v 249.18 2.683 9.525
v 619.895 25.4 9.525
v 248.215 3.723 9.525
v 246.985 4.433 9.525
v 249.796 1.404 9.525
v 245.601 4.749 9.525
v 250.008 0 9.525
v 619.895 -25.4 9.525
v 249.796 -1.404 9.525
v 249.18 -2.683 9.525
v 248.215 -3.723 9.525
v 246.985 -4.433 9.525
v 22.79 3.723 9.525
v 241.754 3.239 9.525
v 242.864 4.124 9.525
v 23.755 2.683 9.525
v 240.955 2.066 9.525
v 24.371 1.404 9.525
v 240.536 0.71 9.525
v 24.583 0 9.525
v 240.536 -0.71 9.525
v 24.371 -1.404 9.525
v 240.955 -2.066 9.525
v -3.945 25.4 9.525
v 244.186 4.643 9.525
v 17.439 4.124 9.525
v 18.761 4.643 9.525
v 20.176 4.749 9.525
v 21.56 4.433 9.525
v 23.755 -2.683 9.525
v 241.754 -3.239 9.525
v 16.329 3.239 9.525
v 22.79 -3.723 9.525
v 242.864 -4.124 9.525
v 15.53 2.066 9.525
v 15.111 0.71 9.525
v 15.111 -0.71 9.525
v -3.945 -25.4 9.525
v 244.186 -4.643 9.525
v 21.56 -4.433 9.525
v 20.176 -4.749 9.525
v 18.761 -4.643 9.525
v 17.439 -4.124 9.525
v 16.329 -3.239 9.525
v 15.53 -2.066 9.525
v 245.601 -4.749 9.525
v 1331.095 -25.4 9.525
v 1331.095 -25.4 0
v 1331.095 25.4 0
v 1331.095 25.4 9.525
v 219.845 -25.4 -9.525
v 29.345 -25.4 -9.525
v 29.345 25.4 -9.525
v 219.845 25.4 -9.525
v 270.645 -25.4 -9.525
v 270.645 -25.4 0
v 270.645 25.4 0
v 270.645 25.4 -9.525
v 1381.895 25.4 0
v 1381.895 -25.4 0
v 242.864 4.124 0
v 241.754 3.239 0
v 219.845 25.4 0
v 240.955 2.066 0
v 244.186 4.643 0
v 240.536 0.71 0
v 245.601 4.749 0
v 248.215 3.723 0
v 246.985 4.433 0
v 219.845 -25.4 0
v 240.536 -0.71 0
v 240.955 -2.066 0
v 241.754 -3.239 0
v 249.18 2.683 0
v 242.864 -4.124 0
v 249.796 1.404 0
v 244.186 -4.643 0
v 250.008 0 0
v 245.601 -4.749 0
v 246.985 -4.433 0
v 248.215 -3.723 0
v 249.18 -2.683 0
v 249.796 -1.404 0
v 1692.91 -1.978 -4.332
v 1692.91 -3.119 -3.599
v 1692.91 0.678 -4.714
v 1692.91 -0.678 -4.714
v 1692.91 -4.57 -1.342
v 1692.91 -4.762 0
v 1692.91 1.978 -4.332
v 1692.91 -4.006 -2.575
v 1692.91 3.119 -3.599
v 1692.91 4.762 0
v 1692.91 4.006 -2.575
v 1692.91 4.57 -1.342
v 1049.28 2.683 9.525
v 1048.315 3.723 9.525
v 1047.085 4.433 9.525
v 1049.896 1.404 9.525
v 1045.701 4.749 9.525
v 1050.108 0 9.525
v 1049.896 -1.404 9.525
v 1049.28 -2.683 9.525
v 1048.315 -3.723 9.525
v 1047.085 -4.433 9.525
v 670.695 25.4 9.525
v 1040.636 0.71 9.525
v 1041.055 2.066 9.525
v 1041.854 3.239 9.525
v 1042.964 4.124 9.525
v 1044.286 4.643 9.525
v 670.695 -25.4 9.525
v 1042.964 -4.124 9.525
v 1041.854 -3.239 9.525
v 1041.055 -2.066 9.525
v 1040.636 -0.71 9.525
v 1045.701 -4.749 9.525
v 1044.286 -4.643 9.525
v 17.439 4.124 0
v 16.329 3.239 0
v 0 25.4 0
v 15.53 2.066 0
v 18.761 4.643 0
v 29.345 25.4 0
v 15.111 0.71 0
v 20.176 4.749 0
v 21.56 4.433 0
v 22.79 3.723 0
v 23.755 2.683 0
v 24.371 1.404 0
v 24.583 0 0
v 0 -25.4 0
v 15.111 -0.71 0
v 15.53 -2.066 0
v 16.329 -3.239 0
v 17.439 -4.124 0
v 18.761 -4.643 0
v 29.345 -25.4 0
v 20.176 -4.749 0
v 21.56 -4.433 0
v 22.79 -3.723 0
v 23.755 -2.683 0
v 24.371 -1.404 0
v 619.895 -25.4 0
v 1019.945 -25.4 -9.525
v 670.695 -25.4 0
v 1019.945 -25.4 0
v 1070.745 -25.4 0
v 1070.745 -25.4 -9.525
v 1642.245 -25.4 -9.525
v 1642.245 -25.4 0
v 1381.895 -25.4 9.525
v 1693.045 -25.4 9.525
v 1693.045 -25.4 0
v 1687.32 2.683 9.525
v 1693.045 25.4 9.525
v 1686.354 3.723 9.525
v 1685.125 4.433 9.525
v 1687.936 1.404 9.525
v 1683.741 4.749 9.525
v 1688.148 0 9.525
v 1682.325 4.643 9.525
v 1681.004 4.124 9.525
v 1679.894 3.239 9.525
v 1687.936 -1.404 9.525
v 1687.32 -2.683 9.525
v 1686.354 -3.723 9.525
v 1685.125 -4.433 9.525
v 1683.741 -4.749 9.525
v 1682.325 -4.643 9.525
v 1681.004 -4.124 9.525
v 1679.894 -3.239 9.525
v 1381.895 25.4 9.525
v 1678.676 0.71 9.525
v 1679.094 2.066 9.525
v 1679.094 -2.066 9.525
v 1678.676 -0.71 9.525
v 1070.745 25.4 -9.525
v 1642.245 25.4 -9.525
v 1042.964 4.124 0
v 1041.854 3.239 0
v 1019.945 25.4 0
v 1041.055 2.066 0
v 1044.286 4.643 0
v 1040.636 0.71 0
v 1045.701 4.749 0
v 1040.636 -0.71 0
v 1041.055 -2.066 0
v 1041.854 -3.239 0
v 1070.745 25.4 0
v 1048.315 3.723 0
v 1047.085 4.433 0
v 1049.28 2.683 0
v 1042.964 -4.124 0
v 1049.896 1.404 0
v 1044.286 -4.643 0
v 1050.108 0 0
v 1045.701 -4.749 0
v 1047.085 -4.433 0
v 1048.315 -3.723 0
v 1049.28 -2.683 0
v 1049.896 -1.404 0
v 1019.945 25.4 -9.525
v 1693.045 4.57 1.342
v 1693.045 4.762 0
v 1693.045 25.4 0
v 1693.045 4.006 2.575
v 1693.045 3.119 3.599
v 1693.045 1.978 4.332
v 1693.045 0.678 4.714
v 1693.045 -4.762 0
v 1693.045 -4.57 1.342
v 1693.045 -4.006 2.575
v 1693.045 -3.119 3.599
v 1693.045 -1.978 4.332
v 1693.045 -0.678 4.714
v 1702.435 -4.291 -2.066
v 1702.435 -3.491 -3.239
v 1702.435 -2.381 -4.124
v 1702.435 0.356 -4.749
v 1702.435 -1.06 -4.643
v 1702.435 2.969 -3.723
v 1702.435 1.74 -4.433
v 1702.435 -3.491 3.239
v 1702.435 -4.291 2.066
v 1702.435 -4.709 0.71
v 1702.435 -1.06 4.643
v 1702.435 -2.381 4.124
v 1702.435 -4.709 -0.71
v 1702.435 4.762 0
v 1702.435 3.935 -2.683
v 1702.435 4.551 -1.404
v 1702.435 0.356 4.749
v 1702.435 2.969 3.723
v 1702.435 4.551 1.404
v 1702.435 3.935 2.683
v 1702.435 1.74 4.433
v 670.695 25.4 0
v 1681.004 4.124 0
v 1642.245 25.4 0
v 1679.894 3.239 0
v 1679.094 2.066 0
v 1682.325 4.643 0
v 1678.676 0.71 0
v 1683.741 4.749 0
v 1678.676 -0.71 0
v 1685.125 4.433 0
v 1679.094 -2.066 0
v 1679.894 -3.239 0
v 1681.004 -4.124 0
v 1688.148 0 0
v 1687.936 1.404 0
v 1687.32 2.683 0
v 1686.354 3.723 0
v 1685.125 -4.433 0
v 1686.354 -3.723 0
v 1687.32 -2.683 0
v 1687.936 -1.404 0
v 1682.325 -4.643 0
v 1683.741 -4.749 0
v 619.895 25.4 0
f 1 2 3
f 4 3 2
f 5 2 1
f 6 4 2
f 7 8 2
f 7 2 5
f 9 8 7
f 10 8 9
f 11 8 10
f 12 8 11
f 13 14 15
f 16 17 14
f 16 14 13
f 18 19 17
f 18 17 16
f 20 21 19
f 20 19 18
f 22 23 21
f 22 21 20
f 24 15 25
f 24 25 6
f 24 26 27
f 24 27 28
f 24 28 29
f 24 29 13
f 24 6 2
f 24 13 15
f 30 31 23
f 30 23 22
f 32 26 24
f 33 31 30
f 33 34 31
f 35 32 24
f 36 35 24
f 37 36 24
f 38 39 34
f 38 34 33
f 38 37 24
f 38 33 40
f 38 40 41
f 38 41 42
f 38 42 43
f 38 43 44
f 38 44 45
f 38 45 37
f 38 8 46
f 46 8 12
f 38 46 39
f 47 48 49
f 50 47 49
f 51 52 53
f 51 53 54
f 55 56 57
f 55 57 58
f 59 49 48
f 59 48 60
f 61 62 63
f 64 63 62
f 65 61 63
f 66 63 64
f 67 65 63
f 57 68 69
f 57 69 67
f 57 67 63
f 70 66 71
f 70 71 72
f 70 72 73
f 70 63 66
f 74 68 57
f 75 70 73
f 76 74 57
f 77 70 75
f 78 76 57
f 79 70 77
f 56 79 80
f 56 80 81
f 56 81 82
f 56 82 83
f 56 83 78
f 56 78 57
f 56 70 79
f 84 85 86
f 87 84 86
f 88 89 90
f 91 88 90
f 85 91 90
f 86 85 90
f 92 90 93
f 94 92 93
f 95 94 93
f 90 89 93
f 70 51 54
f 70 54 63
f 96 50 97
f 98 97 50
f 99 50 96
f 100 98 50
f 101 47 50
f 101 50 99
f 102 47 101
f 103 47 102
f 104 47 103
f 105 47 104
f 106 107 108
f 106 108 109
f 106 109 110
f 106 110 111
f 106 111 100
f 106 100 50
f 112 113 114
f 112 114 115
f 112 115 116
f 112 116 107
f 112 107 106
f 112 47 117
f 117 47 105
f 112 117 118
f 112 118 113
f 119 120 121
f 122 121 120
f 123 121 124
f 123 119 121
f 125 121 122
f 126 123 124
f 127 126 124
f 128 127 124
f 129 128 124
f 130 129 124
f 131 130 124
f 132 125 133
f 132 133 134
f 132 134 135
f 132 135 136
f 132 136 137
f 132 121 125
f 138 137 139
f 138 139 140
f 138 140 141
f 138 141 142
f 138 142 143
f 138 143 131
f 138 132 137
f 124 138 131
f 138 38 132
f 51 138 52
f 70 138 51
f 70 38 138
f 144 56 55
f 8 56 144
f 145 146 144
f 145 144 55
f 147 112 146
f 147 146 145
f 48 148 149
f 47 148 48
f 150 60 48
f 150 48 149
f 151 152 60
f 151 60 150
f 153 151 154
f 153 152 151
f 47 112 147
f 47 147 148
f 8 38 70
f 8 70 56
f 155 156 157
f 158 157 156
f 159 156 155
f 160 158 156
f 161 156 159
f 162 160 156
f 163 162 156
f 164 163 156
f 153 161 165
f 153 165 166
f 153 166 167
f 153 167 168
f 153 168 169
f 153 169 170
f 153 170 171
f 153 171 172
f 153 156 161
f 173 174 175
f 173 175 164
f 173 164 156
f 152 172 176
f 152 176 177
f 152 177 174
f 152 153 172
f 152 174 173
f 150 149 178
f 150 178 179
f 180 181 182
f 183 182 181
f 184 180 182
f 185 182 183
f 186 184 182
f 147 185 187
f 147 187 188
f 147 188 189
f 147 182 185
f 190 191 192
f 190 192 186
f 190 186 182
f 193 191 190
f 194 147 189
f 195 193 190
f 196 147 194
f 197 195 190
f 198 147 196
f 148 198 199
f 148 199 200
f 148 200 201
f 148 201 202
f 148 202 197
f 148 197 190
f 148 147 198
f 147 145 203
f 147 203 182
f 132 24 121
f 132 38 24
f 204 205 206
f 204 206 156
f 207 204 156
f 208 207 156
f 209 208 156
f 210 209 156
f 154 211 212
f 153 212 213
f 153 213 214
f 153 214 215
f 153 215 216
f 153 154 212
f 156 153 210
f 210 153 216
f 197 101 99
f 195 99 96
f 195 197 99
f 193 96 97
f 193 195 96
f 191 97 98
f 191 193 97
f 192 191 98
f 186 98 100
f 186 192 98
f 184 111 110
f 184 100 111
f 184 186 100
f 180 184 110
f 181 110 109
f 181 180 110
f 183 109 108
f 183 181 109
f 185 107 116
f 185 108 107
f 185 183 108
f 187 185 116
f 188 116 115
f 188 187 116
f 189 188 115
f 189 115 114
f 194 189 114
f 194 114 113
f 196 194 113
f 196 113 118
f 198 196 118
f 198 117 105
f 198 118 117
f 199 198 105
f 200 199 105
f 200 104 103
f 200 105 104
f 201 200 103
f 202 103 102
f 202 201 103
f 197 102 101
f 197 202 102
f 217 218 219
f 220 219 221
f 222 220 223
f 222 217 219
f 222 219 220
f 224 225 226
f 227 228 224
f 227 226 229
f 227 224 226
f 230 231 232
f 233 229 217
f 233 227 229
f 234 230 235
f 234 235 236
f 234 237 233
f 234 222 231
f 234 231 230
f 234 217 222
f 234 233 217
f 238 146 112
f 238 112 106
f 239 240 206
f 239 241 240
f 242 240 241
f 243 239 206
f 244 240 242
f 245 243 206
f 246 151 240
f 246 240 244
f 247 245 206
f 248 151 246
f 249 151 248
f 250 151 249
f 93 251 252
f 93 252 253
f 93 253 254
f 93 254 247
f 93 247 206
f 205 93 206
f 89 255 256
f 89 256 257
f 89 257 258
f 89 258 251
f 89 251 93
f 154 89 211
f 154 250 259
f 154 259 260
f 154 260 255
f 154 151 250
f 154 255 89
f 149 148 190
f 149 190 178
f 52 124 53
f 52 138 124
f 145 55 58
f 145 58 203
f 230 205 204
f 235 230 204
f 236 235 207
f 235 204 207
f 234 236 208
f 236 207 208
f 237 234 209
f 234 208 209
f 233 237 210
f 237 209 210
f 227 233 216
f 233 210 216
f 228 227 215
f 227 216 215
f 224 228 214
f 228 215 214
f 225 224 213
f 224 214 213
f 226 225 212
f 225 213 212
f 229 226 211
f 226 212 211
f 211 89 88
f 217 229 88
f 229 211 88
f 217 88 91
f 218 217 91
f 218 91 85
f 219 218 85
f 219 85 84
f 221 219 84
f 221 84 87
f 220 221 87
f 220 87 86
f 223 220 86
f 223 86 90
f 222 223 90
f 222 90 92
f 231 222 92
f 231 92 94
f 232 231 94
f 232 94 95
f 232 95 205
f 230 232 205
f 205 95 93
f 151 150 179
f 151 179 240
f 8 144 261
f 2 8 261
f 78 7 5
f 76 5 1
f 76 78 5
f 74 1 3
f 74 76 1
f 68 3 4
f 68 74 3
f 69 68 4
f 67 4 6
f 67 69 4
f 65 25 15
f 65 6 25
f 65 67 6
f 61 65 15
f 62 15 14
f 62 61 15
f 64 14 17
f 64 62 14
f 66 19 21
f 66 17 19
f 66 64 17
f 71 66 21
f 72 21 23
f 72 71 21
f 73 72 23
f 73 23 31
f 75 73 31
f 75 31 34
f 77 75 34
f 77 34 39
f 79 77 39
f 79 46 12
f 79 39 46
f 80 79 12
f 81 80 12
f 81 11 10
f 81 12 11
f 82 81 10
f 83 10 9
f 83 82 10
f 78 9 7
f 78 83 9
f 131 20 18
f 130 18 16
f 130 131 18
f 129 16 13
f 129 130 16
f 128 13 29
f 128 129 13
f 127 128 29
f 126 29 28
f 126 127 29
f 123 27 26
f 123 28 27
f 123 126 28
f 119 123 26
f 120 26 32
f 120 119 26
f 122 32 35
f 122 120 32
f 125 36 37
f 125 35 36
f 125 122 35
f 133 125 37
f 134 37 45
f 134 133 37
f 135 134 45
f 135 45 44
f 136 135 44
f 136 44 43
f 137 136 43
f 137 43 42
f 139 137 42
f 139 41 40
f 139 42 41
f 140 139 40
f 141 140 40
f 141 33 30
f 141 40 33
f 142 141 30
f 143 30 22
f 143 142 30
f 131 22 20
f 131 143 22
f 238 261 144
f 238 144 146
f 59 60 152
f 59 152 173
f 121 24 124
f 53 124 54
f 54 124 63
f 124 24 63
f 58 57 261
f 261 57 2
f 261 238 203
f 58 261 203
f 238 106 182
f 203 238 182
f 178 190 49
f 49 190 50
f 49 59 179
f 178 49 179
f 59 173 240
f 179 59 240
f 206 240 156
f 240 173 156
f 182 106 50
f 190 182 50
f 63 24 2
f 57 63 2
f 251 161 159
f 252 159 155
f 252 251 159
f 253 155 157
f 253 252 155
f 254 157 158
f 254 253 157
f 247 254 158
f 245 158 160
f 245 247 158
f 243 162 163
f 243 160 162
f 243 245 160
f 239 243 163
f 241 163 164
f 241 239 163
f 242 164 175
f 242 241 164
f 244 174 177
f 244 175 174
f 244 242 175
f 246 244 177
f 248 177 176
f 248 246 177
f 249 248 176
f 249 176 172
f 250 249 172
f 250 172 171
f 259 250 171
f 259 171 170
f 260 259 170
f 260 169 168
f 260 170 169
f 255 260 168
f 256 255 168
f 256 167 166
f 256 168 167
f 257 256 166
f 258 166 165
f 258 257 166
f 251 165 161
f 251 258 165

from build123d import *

# Parameters (mm, degrees)
F1_DEPTH = 25.4
F3_R     = 4.7625
F4_DEPTH = 9.525
F5_R     = 4.7625
F6_DEPTH = 25.4
F7_W     = 50.8
F7_H     = 314.218193
F7_H_2   = 134.387314
F8_DEPTH = 25.4


with BuildPart() as f1:
    # F0 (on Front) → F1 (new body, symmetric)
    with BuildSketch(Plane.XZ):
        Polygon((29.345384, 0), (29.345384, -9.525), (219.845384, -9.525), (219.845384, 0), (270.645384, 0), (270.645384, -9.525), (1019.945384, -9.525), (1019.945384, 0), (1070.745384, 0), (1070.745384, -9.525), (1642.245384, -9.525), (1642.245384, 0), (1693.045384, 0), (1693.045384, 9.525), (-3.945384, 9.525), (0, 0), align=None)
    extrude(amount=F1_DEPTH, both=True)

    # F3 (on offset) → F4 (join)
    with BuildSketch(Plane.YZ.offset(1692.91)):
        Circle(F3_R)
    extrude(amount=F4_DEPTH)

    # F5 (on Top) → F6 (cut)
    with BuildSketch(Plane.XY):
        with Locations((245.245384, 0)):
            Circle(F5_R)
        with Locations((1045.345384, 0)):
            Circle(F5_R)
        with Locations((1683.385, 0)):
            Circle(F5_R)
        with Locations((19.820384, 0)):
            Circle(F5_R)
    extrude(amount=F6_DEPTH, mode=Mode.SUBTRACT)

    # F7 (on Top) → F8 (cut)
    with BuildSketch(Plane.XY):
        with Locations((645.295384, 95.500171)):
            Rectangle(F7_W, F7_H)
        with Locations((1356.495384, -4.853446)):
            Rectangle(F7_W, F7_H_2)
    extrude(amount=F8_DEPTH, mode=Mode.SUBTRACT)


solid = f1.part
